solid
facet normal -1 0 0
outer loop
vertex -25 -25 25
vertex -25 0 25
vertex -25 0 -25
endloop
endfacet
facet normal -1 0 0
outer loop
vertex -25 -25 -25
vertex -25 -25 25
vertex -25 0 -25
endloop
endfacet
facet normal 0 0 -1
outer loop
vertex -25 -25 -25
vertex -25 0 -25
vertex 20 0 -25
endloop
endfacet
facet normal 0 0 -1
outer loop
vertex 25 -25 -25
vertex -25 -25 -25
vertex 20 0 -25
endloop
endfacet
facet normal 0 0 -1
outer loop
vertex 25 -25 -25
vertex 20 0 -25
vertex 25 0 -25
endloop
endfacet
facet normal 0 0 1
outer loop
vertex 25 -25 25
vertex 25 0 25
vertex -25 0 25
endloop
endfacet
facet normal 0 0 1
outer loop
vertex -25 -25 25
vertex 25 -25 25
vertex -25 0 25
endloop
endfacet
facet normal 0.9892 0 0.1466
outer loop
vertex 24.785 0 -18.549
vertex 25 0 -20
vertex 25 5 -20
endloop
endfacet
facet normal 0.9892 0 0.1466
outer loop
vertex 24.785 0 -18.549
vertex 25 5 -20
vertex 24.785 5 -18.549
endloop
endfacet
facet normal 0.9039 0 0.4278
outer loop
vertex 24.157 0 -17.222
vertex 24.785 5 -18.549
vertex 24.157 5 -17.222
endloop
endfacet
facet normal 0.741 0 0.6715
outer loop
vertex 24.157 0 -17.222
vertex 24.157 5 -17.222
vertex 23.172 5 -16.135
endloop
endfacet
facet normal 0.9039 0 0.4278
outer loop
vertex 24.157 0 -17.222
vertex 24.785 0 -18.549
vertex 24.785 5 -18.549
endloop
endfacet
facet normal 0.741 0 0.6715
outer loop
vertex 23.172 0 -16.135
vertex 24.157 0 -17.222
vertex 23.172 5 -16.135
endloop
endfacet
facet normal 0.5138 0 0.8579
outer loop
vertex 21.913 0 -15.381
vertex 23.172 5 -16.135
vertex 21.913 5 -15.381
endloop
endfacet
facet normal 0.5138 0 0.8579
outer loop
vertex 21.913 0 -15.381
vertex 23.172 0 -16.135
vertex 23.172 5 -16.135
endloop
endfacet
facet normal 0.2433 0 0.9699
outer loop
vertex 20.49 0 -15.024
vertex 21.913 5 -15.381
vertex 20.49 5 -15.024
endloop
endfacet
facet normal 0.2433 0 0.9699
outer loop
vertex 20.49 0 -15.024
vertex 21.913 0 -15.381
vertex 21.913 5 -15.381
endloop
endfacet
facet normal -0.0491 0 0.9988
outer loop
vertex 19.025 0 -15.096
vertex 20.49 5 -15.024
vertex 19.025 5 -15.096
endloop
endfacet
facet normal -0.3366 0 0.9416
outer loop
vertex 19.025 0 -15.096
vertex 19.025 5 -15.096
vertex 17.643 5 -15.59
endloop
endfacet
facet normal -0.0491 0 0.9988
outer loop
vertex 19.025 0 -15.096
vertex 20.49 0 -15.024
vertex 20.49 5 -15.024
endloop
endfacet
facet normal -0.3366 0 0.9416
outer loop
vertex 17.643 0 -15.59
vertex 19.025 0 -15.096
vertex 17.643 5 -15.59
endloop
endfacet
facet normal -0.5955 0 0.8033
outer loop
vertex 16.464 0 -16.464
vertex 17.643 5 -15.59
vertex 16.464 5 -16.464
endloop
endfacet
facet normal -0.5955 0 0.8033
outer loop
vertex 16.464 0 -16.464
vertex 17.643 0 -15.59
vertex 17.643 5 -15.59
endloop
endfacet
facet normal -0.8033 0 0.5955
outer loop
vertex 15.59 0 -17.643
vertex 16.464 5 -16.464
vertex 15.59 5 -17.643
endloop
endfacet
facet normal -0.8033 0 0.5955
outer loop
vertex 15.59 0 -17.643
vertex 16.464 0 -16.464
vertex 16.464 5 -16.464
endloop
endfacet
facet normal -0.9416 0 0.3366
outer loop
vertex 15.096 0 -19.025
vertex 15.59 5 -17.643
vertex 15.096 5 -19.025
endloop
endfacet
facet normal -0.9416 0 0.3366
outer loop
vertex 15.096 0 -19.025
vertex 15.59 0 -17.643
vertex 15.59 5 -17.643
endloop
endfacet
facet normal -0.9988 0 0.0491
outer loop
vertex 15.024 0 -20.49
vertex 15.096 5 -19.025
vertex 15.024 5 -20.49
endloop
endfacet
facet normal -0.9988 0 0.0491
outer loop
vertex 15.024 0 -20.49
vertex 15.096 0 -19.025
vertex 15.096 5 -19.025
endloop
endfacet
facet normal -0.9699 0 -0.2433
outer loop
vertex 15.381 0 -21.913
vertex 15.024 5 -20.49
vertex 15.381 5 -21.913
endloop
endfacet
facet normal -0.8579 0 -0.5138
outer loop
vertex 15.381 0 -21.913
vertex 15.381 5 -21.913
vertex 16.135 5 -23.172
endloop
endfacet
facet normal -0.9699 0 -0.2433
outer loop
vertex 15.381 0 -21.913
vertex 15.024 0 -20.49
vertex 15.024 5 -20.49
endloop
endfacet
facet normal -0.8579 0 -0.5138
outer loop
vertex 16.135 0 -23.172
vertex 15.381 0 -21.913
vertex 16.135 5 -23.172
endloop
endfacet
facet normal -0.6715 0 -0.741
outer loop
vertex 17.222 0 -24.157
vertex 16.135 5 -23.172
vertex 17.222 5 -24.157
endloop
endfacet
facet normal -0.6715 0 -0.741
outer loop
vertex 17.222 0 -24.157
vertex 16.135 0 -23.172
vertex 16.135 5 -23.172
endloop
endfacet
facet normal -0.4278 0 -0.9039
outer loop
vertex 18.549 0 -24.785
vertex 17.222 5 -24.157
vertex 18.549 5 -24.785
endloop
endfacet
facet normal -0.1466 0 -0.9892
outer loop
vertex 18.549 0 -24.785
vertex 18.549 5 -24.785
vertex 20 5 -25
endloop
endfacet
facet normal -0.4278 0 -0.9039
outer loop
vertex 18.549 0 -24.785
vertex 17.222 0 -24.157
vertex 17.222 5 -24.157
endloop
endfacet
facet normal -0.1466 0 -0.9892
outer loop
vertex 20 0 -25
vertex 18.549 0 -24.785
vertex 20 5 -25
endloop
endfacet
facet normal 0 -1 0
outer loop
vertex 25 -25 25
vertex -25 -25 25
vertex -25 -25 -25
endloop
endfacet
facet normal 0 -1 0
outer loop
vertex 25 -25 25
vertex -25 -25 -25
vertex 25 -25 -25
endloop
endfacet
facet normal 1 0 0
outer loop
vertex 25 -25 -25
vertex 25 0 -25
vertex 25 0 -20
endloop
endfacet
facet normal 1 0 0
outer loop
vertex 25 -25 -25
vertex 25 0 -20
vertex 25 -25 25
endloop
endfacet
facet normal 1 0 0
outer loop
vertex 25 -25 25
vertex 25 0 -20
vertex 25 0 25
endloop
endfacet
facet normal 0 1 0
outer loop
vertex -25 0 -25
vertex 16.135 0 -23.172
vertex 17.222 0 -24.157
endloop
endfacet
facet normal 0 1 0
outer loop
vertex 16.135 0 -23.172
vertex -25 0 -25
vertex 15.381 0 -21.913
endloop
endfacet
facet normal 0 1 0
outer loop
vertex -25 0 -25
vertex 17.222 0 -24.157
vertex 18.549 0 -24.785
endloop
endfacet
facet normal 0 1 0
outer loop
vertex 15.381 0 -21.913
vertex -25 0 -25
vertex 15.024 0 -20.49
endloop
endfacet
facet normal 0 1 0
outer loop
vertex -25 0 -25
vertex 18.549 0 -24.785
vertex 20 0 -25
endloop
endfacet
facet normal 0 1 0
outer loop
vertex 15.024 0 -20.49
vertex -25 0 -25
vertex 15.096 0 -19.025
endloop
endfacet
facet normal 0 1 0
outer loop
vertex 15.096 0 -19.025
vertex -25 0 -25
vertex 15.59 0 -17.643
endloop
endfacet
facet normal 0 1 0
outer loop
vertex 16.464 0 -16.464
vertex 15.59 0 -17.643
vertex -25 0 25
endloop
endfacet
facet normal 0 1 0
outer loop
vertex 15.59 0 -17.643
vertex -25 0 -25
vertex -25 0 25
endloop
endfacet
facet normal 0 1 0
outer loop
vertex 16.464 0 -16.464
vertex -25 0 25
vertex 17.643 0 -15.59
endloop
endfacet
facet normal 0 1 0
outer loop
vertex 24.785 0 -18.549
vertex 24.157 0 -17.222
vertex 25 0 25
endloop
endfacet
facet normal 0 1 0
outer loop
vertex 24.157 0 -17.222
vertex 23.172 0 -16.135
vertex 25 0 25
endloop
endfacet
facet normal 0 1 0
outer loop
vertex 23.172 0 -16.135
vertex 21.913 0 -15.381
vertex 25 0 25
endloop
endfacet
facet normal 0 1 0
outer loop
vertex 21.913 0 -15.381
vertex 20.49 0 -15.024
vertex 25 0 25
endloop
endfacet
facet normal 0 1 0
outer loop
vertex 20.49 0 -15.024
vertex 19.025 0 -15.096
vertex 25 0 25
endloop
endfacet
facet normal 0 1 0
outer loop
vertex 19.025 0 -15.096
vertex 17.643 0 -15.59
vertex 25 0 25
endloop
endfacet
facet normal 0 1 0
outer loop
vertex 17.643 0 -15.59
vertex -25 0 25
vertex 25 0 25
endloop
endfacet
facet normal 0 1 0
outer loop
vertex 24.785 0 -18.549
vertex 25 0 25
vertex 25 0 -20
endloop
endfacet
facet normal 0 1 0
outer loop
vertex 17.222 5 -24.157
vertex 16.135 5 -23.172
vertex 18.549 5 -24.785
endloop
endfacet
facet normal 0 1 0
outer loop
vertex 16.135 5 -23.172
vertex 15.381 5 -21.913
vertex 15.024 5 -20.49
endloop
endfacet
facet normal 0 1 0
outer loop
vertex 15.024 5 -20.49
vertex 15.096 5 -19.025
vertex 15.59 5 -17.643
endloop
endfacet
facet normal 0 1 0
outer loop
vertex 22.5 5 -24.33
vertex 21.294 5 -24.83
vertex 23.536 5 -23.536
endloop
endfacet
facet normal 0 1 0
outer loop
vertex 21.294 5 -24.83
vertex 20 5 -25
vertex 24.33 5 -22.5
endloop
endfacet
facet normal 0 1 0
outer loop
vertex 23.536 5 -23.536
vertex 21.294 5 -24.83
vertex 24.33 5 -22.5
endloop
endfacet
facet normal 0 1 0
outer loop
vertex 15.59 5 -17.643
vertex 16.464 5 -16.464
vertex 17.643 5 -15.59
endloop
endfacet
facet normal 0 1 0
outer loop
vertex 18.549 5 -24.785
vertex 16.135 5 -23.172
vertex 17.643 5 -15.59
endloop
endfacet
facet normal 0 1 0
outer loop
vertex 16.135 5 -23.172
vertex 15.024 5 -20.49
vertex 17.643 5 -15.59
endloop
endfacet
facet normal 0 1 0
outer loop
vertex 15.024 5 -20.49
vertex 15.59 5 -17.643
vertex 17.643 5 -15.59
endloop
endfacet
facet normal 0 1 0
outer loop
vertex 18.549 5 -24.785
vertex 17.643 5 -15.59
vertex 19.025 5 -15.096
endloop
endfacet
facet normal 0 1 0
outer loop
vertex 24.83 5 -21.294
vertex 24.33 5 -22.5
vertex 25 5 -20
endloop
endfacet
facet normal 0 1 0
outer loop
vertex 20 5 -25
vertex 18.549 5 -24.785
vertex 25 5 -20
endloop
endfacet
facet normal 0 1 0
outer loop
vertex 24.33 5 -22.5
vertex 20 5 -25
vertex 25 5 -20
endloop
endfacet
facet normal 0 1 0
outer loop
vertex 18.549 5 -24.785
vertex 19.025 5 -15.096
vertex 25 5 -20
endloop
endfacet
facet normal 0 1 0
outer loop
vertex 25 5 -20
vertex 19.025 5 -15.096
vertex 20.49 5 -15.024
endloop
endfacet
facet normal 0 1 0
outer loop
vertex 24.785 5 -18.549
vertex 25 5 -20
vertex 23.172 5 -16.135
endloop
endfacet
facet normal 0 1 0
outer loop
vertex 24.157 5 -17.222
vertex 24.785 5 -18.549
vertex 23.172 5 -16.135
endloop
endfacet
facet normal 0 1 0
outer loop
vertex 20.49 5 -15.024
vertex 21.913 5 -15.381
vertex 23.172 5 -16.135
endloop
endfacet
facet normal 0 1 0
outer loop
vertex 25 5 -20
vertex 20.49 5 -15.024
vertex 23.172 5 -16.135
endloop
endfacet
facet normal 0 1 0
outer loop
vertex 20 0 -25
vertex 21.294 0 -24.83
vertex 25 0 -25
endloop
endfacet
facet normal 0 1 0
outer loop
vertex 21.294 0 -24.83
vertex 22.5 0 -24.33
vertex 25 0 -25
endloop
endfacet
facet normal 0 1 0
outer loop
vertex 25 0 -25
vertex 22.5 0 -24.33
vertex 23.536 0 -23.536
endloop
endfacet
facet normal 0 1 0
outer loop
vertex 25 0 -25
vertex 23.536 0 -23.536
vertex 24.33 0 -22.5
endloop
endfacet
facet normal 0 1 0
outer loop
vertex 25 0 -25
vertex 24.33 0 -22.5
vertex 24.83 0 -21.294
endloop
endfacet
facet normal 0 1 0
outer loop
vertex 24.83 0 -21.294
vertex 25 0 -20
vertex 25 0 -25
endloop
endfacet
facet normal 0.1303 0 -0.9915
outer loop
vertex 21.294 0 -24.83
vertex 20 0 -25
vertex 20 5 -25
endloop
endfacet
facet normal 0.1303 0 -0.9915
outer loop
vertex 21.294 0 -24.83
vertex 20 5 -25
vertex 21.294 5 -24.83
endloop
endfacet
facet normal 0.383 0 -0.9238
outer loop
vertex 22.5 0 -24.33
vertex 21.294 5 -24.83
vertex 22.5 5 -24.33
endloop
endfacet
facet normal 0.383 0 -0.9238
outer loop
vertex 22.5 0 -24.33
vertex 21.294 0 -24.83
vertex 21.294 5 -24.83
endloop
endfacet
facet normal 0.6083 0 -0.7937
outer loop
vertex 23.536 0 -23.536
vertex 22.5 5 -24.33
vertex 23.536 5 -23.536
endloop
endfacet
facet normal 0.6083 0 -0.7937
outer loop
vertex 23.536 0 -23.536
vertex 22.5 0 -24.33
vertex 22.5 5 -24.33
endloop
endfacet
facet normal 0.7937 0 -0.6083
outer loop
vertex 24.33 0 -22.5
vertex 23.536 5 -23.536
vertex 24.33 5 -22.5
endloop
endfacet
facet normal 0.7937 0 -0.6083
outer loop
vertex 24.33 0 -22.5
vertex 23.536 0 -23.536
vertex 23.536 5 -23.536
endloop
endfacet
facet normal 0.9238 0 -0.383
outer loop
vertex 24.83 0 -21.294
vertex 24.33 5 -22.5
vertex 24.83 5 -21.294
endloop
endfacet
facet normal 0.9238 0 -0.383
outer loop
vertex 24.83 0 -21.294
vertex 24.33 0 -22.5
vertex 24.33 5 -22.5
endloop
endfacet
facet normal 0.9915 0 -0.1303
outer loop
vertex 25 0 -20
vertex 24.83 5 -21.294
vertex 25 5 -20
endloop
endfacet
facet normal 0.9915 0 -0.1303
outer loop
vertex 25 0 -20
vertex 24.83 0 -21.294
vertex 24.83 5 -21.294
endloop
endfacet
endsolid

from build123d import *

# Parameters (mm, degrees)
F1_DEPTH = 25
F2_DEPTH = 5


with BuildPart() as f1:
    # F0 (on Front) → F1 (new body)
    with BuildSketch(Plane.XZ):
        with BuildLine():
            Line((25, -20), (25, 25))
            Line((25, 25), (-25, 25))
            Line((-25, 25), (-25, -25))
            Line((-25, -25), (20, -25))
            ThreePointArc((20, -25), (16.464466, -16.464466), (25, -20))
        make_face()
        with BuildLine():
            Line((25, -25), (25, -20))
            ThreePointArc((25, -20), (23.535534, -23.535534), (20, -25))
            Line((20, -25), (25, -25))
        make_face()
        with BuildLine():
            ThreePointArc((20, -25), (23.535534, -23.535534), (25, -20))
            ThreePointArc((25, -20), (16.464466, -16.464466), (20, -25))
        make_face()
    extrude(amount=F1_DEPTH)

    # F0 (on Front) → F2 (join)
    with BuildSketch(Plane.XZ):
        with BuildLine():
            ThreePointArc((20, -25), (23.535534, -23.535534), (25, -20))
            ThreePointArc((25, -20), (16.464466, -16.464466), (20, -25))
        make_face()
    extrude(amount=-F2_DEPTH)


solid = f1.part
